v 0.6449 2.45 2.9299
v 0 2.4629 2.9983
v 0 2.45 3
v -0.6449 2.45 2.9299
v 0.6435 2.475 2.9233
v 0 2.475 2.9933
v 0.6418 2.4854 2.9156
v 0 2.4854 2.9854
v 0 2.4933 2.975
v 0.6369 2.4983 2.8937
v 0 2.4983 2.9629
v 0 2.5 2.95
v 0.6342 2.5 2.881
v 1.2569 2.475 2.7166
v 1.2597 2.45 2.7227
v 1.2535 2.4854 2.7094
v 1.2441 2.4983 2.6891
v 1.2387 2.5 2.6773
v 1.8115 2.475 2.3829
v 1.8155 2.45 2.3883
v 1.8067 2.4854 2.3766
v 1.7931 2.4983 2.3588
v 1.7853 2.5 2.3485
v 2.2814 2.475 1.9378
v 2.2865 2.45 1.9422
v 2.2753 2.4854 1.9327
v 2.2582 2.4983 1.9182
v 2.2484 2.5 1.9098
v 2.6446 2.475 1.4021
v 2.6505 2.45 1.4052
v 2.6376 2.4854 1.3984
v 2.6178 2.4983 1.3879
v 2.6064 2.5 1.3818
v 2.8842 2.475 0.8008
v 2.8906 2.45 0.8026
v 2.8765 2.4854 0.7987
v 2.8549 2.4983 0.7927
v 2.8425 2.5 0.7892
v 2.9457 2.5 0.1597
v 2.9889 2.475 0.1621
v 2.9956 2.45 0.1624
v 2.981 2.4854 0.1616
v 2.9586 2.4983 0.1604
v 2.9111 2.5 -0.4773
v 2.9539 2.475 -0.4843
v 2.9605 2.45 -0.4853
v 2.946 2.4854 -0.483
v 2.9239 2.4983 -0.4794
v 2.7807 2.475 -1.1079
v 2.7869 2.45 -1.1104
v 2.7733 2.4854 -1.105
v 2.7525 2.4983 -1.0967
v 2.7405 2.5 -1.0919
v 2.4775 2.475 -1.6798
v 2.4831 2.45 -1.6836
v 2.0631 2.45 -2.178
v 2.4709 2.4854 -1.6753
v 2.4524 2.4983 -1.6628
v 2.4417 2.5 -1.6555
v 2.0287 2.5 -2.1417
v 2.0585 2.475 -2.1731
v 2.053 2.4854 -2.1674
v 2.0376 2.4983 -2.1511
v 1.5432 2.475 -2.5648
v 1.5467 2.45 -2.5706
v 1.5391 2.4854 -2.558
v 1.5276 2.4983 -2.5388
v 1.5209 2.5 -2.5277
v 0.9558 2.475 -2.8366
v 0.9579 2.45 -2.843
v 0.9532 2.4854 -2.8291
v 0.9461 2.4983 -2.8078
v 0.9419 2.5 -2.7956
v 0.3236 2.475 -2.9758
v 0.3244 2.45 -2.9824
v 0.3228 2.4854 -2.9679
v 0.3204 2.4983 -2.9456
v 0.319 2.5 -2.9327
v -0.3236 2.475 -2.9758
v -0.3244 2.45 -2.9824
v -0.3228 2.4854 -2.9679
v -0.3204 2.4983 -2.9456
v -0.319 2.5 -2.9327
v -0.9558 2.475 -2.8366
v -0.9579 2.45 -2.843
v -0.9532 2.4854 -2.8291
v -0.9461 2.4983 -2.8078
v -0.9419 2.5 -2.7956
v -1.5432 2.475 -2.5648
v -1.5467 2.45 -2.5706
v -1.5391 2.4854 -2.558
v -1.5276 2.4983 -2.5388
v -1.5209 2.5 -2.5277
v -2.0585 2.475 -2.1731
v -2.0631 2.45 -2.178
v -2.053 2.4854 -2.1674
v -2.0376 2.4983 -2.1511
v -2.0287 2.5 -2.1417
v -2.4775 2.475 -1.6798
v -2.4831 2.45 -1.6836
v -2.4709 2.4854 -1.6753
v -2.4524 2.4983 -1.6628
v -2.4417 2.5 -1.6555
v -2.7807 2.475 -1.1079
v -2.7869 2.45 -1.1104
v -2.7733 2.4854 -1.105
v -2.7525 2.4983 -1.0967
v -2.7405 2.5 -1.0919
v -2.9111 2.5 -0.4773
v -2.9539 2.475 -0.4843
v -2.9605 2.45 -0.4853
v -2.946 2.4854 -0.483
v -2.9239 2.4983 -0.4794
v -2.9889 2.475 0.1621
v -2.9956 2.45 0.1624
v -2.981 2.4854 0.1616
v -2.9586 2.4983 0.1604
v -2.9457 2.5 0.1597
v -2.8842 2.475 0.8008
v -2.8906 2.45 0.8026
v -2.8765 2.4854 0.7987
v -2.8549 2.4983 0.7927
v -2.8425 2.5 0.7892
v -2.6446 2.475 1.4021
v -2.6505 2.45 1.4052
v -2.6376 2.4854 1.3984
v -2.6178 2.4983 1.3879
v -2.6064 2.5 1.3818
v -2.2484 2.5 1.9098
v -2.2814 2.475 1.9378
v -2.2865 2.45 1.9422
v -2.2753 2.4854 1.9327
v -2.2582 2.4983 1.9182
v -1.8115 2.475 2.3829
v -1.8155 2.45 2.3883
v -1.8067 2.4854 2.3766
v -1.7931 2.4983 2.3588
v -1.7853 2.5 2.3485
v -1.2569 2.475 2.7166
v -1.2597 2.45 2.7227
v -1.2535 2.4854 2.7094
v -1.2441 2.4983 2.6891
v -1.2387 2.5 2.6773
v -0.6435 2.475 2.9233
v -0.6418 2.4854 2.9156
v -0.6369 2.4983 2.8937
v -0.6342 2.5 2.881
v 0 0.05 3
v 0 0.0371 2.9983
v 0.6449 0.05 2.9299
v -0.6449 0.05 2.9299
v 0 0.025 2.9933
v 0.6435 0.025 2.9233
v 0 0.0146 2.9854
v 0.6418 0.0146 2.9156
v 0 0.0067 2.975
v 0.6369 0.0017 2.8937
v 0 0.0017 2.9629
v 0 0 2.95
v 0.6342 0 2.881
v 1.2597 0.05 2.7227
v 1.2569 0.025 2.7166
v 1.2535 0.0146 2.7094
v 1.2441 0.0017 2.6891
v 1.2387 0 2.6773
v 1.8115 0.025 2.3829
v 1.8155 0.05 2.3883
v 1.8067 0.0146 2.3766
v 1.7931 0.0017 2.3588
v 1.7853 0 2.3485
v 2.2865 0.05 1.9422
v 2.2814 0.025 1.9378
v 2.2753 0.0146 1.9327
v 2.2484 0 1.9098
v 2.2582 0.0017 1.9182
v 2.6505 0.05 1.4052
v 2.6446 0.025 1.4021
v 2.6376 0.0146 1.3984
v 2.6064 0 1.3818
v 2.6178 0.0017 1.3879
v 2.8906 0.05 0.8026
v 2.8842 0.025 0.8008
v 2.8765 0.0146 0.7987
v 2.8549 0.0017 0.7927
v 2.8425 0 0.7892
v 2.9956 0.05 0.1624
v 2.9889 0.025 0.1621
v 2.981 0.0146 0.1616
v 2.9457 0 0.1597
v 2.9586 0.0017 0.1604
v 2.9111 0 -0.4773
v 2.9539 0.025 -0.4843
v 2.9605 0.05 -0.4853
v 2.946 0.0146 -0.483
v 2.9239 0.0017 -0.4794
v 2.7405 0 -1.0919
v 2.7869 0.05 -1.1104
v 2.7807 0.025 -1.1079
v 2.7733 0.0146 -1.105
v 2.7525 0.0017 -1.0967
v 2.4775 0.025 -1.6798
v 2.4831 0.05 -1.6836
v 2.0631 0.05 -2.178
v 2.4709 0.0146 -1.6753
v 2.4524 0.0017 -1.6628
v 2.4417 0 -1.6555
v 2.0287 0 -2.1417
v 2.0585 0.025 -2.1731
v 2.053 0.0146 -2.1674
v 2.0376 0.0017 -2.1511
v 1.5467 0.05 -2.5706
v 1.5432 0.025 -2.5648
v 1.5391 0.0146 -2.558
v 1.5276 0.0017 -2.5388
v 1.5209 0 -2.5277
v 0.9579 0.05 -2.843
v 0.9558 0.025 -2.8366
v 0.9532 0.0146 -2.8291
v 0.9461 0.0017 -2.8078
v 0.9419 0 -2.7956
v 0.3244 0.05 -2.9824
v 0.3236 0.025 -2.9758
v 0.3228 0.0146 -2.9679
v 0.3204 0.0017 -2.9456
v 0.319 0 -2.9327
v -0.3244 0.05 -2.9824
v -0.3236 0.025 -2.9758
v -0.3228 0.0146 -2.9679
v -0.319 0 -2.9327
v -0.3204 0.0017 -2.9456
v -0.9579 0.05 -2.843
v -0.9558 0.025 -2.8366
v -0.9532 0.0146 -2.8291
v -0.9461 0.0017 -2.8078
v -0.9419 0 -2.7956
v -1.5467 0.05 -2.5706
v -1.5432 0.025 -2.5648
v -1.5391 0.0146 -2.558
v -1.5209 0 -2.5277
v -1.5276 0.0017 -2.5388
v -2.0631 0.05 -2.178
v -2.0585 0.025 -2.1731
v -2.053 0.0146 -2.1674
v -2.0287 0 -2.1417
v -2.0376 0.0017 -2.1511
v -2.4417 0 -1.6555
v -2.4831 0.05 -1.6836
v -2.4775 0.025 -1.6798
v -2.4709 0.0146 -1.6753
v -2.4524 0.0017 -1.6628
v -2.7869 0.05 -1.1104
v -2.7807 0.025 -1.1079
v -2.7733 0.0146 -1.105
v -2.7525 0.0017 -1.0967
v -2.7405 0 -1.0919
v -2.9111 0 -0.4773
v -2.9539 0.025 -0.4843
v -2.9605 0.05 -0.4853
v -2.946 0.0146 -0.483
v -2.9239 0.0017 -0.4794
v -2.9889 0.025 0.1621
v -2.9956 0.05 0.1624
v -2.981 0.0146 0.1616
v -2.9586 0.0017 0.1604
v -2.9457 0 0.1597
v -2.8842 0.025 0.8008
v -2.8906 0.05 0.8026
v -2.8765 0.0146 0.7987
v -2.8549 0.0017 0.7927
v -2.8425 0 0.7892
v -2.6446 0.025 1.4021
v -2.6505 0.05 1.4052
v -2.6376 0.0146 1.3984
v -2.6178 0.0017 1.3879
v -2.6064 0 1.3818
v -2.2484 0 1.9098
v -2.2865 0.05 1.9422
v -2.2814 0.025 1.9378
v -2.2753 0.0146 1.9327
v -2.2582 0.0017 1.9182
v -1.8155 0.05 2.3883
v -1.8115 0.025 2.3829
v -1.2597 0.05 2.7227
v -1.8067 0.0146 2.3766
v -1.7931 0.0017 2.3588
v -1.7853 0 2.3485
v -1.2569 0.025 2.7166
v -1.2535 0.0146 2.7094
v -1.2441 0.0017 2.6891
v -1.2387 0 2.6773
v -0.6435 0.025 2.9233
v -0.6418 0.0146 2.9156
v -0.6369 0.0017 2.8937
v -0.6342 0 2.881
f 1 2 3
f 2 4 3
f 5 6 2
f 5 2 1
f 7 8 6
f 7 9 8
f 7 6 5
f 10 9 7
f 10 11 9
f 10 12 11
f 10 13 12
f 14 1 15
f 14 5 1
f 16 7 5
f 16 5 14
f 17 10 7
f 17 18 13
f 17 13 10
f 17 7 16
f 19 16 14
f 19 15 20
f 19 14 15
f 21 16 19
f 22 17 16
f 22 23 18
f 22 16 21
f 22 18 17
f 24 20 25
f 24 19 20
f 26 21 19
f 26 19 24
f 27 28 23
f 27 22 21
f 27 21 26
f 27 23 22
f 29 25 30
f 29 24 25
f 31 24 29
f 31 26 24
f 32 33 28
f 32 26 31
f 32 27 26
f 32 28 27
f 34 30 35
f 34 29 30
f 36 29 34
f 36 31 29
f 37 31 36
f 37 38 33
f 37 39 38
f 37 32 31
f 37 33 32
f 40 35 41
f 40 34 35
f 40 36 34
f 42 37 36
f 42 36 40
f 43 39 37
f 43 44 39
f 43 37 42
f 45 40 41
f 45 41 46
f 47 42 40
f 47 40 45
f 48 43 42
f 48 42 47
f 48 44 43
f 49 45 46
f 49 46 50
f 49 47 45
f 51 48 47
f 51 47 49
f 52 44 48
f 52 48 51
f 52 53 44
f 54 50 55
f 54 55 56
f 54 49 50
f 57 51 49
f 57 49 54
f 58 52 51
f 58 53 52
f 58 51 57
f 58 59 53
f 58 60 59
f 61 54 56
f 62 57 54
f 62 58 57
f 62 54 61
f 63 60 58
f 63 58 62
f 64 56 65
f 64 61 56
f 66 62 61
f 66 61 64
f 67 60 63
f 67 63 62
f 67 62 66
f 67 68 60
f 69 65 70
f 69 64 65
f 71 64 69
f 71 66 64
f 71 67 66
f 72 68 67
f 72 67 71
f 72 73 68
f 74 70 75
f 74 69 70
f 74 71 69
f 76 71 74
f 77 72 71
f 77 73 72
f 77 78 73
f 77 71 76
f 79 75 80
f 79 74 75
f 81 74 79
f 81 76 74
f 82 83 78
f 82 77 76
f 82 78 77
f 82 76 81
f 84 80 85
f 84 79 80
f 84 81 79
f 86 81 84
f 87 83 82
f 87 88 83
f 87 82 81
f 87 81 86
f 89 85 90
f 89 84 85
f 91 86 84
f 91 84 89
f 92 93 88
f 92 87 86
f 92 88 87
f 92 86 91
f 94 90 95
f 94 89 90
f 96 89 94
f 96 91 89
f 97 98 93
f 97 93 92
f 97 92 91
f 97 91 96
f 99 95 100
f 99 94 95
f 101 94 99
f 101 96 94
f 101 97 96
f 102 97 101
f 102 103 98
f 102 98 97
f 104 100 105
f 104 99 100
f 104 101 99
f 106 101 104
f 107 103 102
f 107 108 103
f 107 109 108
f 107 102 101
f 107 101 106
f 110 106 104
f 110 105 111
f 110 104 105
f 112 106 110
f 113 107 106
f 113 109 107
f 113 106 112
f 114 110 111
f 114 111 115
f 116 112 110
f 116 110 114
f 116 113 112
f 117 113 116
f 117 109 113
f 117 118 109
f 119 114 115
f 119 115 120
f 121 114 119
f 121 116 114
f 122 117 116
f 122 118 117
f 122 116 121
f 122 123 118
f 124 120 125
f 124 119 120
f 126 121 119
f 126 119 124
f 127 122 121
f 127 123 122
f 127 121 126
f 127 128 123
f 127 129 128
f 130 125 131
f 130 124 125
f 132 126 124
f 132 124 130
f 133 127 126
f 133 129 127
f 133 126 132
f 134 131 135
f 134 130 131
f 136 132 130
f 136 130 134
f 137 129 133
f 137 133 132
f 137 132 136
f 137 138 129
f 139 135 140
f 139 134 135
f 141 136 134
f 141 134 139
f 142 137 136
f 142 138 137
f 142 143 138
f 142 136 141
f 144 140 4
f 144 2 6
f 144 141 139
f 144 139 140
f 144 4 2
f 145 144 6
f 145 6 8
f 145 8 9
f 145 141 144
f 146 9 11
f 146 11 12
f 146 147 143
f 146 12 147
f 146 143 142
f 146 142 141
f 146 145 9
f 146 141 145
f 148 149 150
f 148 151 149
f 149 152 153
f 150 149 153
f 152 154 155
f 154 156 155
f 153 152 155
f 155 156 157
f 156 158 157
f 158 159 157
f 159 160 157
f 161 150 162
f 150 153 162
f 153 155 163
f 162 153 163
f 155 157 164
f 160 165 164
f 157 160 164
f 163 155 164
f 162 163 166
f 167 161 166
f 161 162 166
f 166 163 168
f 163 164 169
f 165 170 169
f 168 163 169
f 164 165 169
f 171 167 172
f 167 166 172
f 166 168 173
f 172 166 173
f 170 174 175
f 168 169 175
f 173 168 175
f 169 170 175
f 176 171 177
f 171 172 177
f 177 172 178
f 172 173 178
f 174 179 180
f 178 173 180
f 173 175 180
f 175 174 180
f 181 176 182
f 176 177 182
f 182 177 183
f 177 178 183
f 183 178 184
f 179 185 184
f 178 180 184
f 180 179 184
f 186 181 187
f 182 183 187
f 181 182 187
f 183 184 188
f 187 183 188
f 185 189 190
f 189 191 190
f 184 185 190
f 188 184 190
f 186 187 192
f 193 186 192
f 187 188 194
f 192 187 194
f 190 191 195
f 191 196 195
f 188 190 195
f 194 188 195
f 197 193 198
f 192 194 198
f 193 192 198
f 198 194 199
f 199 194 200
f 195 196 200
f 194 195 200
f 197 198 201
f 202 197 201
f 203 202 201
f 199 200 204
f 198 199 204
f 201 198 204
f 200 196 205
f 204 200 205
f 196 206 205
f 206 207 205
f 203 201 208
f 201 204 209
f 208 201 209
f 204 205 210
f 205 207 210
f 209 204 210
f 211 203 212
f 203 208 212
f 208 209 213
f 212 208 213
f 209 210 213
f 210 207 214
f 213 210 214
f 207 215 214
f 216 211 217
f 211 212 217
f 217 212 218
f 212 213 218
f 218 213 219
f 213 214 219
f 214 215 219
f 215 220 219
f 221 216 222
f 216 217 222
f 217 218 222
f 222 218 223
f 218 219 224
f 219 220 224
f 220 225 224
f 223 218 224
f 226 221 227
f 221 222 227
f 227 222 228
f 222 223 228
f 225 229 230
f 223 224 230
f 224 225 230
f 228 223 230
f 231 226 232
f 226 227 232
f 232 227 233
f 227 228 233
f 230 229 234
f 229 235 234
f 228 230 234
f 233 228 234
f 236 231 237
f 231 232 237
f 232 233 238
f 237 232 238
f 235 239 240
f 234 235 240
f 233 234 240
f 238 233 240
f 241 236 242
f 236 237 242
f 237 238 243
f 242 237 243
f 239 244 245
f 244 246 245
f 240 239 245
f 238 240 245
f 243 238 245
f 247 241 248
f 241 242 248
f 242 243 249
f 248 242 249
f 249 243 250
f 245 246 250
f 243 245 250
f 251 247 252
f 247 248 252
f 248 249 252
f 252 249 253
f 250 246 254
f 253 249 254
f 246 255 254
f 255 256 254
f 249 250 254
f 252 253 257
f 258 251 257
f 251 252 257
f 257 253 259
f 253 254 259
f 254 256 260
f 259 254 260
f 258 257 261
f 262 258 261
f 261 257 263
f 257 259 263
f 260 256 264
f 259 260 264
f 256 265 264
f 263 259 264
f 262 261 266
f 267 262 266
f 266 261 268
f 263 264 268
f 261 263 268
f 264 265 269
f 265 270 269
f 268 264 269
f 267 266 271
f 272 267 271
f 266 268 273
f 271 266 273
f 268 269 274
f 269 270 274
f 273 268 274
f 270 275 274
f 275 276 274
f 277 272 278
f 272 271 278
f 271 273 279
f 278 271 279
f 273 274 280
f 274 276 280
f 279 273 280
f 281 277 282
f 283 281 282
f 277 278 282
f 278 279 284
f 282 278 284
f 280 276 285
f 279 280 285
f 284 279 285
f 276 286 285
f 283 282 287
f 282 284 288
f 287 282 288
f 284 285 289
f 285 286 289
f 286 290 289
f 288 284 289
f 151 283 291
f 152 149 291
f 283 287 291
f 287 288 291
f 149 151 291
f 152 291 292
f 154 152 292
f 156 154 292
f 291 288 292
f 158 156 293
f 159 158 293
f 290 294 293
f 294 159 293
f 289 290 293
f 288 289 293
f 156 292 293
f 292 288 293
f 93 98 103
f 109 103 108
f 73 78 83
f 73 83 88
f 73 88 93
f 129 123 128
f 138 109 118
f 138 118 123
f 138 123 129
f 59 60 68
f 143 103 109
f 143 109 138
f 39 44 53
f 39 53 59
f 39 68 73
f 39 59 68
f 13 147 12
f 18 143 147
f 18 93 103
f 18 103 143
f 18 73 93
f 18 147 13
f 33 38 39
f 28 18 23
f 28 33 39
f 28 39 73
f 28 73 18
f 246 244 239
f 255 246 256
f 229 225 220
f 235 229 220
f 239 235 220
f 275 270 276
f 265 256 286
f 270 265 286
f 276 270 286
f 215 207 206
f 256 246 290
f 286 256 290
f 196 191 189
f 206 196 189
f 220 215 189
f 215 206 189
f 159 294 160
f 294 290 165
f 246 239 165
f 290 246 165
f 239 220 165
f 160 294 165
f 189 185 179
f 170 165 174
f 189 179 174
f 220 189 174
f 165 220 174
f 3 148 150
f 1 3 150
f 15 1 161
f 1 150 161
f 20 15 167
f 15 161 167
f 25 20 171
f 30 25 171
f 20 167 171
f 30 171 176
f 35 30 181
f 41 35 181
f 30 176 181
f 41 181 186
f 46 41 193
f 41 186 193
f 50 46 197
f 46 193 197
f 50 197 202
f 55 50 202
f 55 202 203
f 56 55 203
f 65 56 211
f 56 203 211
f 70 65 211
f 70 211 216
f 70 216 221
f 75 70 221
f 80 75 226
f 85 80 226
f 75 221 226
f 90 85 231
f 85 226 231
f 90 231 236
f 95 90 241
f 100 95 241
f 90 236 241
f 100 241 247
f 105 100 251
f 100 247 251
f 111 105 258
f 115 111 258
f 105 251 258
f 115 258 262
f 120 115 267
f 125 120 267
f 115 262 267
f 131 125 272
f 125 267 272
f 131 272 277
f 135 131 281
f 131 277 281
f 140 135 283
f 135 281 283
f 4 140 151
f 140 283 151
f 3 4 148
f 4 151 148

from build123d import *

# Parameters (mm, degrees)
SKETCH_1_R      = 3
EXTRUDE_1_DEPTH = 2.5
FILLET_1_R      = 0.05
FILLET_2_R      = 0.05


with BuildPart() as part:
    # Эскиз1 → Бобышка-Вытянуть1 (new body)
    with BuildSketch(Plane(origin=(0, 0, 0), x_dir=(1, 0, 0), z_dir=(0, 1, 0))):
        with Locations(Location((0, 0, 0), (0, 0, 270))):
            Circle(SKETCH_1_R)
    extrude(amount=EXTRUDE_1_DEPTH)

    # Скругление1
    fillet_1_edges = [part.edges().sort_by_distance(p)[0] for p in [
        (0, 2.5, -3),
    ]]
    fillet(fillet_1_edges, radius=FILLET_1_R)

    # Скругление2
    fillet_2_edges = [part.edges().sort_by_distance(p)[0] for p in [
        (0, 0, -3),
    ]]
    fillet(fillet_2_edges, radius=FILLET_2_R)


solid = part.part
